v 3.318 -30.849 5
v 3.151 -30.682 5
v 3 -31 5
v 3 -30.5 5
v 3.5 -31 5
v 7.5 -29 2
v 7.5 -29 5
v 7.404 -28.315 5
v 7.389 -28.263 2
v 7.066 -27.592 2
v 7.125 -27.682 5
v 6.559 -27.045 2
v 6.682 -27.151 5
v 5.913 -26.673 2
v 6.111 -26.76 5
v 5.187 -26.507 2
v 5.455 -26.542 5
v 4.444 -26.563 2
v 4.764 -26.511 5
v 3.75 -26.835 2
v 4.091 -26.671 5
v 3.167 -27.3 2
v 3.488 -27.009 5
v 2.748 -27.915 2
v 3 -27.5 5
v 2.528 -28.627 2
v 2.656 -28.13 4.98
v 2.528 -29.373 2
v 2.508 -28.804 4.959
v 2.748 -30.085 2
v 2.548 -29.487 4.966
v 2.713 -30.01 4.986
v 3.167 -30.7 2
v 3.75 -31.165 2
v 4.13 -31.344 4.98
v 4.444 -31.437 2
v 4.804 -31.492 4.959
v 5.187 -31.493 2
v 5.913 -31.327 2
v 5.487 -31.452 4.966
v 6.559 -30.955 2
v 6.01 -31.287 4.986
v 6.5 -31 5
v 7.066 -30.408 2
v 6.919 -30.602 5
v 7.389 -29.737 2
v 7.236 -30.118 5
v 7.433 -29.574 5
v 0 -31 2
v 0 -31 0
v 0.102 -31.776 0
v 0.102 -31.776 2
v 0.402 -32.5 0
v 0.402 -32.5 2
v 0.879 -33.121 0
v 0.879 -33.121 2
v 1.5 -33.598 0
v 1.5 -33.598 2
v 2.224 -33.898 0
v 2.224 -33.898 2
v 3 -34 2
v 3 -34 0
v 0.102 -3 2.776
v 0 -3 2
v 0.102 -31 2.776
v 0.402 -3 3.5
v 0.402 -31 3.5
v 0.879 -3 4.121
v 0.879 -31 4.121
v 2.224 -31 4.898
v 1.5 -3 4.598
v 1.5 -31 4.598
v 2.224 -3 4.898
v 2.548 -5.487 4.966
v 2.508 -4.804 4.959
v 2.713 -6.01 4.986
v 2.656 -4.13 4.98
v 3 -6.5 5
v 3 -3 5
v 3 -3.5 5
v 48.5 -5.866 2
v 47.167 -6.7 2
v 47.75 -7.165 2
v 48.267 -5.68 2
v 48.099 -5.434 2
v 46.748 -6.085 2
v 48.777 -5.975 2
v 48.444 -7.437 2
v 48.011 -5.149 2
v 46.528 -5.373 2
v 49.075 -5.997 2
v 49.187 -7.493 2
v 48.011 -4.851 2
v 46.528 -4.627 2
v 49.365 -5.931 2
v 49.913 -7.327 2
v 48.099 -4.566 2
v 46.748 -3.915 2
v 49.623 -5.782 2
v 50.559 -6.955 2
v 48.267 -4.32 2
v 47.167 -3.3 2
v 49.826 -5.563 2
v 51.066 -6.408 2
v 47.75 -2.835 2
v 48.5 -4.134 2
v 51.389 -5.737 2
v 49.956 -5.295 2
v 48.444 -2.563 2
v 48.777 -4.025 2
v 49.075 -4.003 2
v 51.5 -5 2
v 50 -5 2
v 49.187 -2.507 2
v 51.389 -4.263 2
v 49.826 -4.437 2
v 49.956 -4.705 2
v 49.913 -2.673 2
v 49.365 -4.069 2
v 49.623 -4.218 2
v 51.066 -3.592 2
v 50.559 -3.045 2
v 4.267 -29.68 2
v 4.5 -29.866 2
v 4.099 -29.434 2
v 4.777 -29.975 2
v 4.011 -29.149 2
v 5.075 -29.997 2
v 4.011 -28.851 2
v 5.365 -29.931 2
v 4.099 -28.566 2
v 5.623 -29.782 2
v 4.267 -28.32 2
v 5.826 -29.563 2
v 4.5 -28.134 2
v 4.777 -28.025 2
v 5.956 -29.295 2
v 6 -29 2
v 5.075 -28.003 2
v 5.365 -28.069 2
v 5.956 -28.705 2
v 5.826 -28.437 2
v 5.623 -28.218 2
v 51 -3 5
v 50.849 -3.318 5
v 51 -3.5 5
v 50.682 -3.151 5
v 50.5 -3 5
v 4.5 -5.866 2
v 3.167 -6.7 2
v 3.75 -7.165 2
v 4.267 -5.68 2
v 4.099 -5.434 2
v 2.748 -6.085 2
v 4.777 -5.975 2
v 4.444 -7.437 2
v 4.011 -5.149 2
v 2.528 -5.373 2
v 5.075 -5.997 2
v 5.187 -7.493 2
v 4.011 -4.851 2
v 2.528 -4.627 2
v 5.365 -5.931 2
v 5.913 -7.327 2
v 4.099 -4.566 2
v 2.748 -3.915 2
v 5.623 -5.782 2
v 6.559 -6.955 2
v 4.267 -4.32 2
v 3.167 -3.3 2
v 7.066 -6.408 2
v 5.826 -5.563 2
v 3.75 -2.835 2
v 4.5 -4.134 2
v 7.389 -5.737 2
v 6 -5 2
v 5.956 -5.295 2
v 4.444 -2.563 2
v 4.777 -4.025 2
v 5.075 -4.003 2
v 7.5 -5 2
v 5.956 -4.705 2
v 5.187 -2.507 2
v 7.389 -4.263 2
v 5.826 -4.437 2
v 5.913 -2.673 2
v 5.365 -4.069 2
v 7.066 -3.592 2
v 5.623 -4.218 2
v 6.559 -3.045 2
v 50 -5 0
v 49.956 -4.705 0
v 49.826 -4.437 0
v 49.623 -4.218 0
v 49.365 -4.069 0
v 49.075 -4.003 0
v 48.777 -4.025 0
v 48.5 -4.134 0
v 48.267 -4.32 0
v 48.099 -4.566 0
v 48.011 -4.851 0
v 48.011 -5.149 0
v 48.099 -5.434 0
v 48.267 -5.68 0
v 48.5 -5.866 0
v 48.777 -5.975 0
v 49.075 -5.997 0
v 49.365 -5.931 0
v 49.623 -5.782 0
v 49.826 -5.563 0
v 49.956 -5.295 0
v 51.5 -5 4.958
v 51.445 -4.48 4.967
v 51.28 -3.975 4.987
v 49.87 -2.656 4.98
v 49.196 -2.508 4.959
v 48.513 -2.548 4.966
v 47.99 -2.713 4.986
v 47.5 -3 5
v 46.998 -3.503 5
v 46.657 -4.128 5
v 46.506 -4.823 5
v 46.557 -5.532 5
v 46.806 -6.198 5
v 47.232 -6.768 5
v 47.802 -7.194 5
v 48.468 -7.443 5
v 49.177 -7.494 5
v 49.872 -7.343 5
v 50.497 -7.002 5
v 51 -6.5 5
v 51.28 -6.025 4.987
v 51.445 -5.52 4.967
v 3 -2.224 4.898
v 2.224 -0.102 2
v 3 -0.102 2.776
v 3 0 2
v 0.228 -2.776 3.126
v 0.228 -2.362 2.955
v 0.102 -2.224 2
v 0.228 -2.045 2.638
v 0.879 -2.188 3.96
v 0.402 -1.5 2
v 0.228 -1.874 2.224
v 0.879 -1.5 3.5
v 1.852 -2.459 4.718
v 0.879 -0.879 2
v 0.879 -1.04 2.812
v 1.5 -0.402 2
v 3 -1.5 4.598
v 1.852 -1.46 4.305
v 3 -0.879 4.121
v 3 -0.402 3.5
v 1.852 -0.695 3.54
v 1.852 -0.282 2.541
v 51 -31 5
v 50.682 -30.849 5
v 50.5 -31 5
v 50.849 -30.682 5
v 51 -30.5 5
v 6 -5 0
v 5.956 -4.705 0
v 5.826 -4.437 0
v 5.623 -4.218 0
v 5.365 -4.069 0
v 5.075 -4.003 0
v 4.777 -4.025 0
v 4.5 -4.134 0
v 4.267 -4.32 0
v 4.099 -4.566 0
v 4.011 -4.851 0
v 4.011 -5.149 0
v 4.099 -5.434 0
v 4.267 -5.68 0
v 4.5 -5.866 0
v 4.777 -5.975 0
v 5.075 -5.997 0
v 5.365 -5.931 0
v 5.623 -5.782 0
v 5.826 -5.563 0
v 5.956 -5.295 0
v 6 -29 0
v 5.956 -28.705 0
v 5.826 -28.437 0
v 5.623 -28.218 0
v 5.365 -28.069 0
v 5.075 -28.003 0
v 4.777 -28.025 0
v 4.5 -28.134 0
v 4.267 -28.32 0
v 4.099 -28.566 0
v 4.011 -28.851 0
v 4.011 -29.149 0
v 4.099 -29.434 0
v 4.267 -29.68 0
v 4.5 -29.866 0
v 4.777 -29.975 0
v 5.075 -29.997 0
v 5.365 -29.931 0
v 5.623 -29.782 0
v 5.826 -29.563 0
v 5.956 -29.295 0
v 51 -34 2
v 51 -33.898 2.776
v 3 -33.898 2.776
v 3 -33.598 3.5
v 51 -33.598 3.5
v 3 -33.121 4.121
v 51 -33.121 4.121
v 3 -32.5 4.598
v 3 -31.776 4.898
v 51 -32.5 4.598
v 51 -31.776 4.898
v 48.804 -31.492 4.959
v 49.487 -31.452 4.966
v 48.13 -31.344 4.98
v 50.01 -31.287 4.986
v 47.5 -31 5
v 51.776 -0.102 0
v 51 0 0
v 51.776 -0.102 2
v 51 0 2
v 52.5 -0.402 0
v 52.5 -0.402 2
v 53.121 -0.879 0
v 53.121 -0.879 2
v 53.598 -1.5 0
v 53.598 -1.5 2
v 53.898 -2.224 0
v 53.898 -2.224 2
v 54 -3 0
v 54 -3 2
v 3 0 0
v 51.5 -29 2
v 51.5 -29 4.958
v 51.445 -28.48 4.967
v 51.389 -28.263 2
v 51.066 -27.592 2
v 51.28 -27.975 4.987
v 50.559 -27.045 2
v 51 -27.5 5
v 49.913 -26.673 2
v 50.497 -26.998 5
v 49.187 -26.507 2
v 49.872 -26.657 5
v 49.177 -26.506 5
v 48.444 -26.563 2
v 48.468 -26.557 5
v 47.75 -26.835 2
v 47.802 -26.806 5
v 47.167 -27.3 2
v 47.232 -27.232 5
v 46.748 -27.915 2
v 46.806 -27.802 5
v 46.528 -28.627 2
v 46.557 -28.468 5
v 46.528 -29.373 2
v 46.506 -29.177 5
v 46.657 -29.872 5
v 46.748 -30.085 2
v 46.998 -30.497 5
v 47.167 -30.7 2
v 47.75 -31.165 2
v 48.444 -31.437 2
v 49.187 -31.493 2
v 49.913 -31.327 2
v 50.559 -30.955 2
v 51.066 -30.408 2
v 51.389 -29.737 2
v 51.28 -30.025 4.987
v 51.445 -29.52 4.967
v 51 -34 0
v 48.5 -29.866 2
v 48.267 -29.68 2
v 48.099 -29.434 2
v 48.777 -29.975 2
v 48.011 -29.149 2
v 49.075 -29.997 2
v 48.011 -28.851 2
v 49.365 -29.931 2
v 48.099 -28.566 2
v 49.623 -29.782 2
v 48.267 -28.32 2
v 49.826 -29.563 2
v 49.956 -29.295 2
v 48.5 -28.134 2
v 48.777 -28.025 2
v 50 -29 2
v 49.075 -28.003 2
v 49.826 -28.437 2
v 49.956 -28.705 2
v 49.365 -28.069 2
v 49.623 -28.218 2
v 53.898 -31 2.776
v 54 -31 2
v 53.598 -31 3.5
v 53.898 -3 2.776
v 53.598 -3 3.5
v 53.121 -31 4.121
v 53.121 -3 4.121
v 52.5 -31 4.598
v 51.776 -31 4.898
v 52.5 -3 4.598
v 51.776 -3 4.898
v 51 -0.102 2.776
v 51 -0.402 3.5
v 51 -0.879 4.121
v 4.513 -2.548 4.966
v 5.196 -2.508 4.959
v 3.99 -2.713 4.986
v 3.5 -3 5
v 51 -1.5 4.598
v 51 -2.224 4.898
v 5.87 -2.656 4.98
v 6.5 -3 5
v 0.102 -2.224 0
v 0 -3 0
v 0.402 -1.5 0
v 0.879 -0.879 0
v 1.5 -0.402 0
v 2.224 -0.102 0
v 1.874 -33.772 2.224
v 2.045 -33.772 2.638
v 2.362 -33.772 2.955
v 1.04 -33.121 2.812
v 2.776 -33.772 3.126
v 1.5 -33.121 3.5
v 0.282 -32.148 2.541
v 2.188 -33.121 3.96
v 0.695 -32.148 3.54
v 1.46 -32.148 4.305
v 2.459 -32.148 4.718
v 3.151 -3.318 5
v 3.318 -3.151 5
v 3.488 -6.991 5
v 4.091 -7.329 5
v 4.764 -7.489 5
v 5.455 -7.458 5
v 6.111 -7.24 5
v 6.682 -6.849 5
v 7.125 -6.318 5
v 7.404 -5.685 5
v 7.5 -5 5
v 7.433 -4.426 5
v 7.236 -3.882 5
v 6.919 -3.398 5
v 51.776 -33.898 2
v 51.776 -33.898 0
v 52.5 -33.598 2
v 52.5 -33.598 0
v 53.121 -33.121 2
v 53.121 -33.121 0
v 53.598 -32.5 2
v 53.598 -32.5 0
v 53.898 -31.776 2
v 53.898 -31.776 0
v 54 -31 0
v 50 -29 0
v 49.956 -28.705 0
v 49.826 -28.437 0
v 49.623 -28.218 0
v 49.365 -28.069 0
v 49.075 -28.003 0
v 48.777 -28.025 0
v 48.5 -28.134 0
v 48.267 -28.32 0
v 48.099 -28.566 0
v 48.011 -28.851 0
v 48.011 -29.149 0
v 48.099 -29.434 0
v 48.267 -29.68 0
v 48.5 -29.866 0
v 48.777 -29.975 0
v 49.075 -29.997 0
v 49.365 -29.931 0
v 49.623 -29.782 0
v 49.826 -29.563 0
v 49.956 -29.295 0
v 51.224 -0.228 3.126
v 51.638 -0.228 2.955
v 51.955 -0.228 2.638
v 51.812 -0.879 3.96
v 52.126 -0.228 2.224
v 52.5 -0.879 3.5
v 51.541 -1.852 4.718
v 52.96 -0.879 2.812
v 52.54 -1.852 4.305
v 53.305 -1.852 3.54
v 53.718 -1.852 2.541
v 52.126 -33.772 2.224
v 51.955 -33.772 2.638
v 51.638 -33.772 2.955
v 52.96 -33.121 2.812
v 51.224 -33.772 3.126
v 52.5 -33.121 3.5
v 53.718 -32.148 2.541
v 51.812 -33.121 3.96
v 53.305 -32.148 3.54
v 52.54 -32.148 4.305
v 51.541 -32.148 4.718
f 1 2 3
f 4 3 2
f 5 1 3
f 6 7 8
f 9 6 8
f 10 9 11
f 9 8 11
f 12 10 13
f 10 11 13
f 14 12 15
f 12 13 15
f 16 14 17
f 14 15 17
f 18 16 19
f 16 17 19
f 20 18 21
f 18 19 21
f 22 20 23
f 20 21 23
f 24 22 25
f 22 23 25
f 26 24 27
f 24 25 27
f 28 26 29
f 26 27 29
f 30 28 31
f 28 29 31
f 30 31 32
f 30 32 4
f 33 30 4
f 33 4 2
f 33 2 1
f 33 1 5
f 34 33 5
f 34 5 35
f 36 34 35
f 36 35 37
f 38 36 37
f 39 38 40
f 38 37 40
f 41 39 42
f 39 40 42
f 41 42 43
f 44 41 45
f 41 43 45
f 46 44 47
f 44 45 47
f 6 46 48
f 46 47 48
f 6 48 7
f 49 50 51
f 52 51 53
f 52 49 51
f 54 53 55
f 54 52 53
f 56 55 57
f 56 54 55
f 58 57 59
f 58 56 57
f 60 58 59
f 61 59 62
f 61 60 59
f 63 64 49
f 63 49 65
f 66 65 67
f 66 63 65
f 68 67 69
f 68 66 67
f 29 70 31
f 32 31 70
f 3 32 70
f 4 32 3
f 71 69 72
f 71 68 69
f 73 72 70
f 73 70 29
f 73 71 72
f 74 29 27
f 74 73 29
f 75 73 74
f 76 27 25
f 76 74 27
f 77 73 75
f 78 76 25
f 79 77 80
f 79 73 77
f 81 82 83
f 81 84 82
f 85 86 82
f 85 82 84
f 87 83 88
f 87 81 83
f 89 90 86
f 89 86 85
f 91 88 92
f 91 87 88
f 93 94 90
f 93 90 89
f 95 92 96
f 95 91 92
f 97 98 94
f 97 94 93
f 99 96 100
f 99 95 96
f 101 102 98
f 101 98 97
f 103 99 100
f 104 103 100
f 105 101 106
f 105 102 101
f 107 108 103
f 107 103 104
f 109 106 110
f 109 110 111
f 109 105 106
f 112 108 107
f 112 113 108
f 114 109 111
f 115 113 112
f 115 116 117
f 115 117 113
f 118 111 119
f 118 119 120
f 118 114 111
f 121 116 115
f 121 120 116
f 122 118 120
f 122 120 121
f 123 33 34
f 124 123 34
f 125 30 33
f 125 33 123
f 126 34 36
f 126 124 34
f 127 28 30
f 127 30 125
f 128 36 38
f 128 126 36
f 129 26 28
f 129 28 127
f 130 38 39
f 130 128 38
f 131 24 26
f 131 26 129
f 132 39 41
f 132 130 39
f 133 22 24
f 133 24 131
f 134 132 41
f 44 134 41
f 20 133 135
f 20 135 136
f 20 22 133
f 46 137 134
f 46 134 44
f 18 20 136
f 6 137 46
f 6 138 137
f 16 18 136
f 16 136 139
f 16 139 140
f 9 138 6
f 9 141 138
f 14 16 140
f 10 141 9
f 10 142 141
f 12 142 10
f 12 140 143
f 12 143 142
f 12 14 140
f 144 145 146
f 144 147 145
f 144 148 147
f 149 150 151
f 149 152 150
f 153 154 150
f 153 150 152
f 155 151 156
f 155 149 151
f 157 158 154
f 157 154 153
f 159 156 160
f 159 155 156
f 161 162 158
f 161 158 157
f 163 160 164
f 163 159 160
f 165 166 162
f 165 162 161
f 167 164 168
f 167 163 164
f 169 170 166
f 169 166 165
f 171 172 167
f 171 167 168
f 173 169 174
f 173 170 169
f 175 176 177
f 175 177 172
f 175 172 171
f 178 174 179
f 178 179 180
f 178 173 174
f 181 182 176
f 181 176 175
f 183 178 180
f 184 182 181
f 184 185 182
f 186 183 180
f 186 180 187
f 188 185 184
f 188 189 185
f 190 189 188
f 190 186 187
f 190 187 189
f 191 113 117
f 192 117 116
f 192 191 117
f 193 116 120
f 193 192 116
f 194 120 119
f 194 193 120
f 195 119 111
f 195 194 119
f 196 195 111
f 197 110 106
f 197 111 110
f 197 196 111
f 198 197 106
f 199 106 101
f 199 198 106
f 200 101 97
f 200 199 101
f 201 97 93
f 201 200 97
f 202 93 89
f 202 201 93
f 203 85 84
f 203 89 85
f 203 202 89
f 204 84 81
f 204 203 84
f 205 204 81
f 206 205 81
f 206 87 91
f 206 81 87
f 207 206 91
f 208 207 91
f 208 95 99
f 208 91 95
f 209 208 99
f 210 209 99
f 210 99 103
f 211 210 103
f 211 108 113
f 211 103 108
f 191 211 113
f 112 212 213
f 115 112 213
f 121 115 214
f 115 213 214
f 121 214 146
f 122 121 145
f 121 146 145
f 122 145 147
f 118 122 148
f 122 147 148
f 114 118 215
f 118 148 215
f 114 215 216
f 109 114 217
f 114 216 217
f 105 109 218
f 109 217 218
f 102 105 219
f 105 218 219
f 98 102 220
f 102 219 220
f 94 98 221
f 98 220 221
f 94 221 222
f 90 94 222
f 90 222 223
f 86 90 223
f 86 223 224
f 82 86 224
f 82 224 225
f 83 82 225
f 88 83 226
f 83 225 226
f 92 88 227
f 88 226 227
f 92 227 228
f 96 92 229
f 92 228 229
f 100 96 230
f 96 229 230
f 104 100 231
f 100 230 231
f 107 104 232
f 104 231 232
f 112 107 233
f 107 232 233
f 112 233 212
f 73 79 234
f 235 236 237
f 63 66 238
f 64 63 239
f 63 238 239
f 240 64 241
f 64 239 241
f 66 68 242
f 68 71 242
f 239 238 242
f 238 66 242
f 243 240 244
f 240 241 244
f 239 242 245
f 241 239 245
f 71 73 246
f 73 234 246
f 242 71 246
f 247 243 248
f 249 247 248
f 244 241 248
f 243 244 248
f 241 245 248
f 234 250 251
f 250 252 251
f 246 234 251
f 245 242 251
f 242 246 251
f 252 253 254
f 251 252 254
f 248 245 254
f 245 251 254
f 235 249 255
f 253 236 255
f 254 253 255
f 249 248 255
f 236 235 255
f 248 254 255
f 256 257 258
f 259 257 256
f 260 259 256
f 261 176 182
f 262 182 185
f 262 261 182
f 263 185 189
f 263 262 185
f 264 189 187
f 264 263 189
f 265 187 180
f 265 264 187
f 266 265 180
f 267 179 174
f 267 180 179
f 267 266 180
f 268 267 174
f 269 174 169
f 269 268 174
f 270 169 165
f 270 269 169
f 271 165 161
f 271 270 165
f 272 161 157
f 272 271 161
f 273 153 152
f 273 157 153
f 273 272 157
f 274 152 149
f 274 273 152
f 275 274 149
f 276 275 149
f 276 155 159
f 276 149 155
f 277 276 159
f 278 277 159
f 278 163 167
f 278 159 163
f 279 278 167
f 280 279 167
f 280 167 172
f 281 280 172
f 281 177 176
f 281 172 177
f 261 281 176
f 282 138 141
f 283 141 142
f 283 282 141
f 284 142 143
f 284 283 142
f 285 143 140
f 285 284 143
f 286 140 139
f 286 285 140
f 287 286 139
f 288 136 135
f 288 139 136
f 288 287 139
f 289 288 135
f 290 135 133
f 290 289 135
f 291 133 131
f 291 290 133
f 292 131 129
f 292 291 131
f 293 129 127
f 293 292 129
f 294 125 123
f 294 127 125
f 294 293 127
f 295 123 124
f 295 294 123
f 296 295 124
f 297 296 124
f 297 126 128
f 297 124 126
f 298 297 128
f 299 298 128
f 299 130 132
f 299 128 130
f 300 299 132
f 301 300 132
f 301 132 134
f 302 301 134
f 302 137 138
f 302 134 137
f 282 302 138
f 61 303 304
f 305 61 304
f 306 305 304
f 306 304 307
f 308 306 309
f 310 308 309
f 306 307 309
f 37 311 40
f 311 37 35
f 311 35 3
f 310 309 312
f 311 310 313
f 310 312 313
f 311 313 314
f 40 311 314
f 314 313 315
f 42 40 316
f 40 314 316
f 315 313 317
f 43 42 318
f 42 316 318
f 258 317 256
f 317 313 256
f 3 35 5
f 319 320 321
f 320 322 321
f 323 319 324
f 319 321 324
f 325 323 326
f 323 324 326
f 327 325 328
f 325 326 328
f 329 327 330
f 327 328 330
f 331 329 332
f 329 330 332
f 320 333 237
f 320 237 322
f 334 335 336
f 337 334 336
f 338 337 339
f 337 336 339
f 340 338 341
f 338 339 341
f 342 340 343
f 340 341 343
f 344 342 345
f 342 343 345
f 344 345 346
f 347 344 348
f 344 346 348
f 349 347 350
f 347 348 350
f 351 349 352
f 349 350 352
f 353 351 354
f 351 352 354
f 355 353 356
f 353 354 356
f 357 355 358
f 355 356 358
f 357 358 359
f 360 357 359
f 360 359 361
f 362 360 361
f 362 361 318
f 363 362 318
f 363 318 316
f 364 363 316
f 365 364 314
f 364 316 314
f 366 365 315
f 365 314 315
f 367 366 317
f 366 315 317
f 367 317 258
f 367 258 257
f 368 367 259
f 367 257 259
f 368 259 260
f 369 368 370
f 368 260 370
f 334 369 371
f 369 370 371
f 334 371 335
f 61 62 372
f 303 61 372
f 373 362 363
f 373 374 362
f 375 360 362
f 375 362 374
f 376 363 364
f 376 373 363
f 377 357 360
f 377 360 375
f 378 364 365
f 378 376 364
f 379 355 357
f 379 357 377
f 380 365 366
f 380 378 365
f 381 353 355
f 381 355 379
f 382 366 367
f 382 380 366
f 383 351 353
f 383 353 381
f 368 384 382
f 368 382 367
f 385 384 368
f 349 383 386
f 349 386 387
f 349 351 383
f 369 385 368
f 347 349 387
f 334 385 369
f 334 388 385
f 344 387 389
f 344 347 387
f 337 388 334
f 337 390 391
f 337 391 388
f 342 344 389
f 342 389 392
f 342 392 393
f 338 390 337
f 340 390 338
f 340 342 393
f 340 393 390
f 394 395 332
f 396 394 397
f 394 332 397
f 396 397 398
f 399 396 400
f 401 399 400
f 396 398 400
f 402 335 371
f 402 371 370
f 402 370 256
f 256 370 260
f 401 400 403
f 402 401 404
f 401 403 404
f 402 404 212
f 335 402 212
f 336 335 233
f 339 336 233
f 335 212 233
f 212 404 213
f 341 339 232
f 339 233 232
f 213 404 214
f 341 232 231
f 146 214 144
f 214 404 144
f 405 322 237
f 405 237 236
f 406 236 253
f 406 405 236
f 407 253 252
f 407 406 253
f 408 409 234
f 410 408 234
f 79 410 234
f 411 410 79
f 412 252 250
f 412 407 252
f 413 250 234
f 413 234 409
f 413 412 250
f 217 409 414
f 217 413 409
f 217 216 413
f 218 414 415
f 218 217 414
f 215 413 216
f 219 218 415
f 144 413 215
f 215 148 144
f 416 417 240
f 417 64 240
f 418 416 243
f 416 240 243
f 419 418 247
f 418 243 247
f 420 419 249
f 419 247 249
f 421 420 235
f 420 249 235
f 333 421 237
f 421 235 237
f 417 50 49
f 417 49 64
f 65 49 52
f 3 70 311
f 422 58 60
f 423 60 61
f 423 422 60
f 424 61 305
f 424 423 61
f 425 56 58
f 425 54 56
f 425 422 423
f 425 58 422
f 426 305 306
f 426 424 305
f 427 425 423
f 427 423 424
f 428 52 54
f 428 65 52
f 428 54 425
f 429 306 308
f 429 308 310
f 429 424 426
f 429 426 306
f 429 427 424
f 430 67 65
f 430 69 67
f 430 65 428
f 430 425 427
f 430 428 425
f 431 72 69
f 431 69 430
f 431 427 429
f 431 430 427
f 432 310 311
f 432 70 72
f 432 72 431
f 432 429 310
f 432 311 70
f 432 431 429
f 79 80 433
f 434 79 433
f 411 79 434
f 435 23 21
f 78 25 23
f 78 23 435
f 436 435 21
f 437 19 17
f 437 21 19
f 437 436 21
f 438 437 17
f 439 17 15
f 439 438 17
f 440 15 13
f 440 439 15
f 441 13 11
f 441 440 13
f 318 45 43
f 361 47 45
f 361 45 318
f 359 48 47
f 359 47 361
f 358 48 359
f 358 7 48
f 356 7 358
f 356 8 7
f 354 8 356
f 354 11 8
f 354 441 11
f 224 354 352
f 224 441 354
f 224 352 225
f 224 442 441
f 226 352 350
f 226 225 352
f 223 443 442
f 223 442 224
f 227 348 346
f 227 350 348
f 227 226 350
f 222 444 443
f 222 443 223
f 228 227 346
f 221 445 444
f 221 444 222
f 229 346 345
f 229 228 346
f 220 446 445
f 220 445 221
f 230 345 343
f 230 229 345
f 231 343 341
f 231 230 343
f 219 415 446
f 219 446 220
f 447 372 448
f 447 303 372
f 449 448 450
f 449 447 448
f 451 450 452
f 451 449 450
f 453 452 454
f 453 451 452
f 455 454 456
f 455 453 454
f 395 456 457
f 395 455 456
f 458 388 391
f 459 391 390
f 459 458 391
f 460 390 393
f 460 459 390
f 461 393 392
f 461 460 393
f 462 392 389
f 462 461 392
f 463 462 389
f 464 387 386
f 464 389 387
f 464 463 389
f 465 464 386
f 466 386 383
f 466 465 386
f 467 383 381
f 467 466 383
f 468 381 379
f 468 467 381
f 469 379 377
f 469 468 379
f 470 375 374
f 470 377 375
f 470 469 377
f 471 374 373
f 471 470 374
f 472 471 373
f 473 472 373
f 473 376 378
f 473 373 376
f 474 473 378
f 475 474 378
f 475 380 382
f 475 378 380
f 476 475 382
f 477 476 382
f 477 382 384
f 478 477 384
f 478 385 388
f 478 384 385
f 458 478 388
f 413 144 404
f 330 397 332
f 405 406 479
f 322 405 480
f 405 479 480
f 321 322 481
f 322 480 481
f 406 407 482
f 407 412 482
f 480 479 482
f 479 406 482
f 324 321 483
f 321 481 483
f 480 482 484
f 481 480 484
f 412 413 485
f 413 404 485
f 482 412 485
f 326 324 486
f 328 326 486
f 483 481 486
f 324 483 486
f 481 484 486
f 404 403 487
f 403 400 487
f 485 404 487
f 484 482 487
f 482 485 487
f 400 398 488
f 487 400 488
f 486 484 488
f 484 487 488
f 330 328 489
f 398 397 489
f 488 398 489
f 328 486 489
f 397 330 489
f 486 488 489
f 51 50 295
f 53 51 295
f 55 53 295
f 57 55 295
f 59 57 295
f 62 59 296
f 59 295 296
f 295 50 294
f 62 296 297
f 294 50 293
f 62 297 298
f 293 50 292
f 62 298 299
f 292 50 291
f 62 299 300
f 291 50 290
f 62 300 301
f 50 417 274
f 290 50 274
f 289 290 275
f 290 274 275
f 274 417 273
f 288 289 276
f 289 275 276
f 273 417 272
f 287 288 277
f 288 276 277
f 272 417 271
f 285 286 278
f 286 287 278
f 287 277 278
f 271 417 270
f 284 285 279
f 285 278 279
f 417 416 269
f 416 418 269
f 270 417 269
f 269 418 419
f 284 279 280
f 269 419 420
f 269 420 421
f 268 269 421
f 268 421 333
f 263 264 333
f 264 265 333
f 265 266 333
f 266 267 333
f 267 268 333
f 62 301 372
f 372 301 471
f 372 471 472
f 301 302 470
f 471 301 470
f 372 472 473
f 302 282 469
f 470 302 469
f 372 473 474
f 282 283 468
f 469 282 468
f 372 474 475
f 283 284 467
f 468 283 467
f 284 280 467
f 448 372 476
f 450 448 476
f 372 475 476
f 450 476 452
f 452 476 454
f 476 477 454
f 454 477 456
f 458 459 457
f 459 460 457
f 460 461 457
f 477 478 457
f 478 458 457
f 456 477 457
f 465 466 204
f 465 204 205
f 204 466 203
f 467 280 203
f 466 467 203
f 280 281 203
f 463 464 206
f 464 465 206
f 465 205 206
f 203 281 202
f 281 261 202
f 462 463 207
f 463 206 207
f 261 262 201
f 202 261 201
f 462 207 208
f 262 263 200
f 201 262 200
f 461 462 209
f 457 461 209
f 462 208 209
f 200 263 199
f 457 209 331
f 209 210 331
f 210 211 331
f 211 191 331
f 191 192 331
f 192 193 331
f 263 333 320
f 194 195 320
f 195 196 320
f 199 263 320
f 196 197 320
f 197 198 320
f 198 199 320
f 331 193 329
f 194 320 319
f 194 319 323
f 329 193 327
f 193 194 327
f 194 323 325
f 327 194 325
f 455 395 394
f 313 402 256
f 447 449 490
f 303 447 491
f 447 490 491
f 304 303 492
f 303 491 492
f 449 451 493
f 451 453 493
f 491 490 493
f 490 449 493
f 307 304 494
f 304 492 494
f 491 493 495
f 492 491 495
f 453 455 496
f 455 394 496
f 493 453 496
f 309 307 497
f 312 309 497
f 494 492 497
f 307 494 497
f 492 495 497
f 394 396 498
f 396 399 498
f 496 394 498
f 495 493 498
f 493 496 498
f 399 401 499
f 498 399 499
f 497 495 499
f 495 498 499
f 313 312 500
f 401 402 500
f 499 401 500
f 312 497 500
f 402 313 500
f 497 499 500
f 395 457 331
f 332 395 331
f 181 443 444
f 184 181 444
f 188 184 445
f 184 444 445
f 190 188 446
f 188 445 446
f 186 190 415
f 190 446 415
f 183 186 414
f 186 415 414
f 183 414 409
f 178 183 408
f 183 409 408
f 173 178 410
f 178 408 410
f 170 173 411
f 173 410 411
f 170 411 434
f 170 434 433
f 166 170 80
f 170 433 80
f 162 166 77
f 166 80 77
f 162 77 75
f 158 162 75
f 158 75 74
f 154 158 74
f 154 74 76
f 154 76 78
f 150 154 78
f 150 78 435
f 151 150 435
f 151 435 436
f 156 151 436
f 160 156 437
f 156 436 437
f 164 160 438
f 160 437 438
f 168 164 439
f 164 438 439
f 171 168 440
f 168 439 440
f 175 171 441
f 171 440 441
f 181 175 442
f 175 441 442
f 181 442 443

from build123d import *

# Parameters (mm, degrees)
SKETCH1_W           = 54
SKETCH1_H           = 34
SKETCH1_R           = 1
BOSS_EXTRUDE1_DEPTH = 5
FILLET2_R           = 3
SKETCH2_R           = 2.5
CUT_EXTRUDE1_DEPTH  = 3


with BuildPart() as part:
    # Sketch1 → Boss-Extrude1 (new body)
    with BuildSketch(Plane.XY):
        with Locations((27, -17)):
            Rectangle(SKETCH1_W, SKETCH1_H)
        with Locations((5, -5)):
            Circle(SKETCH1_R, mode=Mode.SUBTRACT)
        with Locations((49, -5)):
            Circle(SKETCH1_R, mode=Mode.SUBTRACT)
        with Locations((49, -29)):
            Circle(SKETCH1_R, mode=Mode.SUBTRACT)
        with Locations((5, -29)):
            Circle(SKETCH1_R, mode=Mode.SUBTRACT)
    extrude(amount=BOSS_EXTRUDE1_DEPTH)

    # Fillet2
    fillet2_edges = [part.edges().sort_by_distance(p)[0] for p in [
        (54, -17, 5),
        (27, 0, 5),
        (0, -17, 5),
        (0, 0, 2.5),
        (54, 0, 2.5),
        (54, -34, 2.5),
        (0, -34, 2.5),
        (27, -34, 5),
    ]]
    fillet(fillet2_edges, radius=FILLET2_R)

    # Sketch2 → Cut-Extrude1 (cut)
    with BuildSketch(Plane.XY.offset(5)):
        with Locations((5, -5)):
            Circle(SKETCH2_R)
        with Locations((5, -29)):
            Circle(SKETCH2_R)
        with Locations((49, -29)):
            Circle(SKETCH2_R)
        with Locations((49, -5)):
            Circle(SKETCH2_R)
    extrude(amount=-CUT_EXTRUDE1_DEPTH, mode=Mode.SUBTRACT)


solid = part.part
